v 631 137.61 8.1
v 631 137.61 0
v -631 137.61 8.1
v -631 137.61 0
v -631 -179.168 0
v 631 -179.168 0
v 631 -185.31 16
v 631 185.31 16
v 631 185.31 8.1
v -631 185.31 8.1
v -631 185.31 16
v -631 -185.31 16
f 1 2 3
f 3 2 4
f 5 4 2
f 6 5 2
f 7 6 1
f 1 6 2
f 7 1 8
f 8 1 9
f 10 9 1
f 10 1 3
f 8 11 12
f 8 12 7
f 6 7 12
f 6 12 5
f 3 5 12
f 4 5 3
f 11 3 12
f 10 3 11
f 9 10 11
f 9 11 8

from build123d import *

# Parameters (mm, degrees)
SKETCH1_W           = 1262
SKETCH1_H           = 370.62
BOSS_EXTRUDE1_DEPTH = 16
SKETCH2_W           = 1262
SKETCH2_H           = 47.7
CUT_EXTRUDE1_DEPTH  = 8.1
CUT_EXTRUDE2_DEPTH  = 1276.633096192


with BuildPart() as part:
    # Sketch1 → Boss-Extrude1 (new body)
    with BuildSketch(Plane.XY):
        Rectangle(SKETCH1_W, SKETCH1_H)
    extrude(amount=BOSS_EXTRUDE1_DEPTH)

    # Sketch2 → Cut-Extrude1 (cut)
    with BuildSketch(Plane(origin=(0, 0, 0), x_dir=(-1, 0, 0), z_dir=(0, 0, -1))):
        with Locations((0, 161.46)):
            Rectangle(SKETCH2_W, SKETCH2_H)
    extrude(amount=-CUT_EXTRUDE1_DEPTH, mode=Mode.SUBTRACT)

    # Sketch3 → Cut-Extrude2 (cut, through all)
    with BuildSketch(Plane(origin=(631, 0, 0), x_dir=(0, 0, -1), z_dir=(1, 0, 0))):
        Polygon((-16, -185.31), (0, -179.168175439), (0, -185.31), align=None)
    extrude(amount=-CUT_EXTRUDE2_DEPTH, mode=Mode.SUBTRACT)


solid = part.part
